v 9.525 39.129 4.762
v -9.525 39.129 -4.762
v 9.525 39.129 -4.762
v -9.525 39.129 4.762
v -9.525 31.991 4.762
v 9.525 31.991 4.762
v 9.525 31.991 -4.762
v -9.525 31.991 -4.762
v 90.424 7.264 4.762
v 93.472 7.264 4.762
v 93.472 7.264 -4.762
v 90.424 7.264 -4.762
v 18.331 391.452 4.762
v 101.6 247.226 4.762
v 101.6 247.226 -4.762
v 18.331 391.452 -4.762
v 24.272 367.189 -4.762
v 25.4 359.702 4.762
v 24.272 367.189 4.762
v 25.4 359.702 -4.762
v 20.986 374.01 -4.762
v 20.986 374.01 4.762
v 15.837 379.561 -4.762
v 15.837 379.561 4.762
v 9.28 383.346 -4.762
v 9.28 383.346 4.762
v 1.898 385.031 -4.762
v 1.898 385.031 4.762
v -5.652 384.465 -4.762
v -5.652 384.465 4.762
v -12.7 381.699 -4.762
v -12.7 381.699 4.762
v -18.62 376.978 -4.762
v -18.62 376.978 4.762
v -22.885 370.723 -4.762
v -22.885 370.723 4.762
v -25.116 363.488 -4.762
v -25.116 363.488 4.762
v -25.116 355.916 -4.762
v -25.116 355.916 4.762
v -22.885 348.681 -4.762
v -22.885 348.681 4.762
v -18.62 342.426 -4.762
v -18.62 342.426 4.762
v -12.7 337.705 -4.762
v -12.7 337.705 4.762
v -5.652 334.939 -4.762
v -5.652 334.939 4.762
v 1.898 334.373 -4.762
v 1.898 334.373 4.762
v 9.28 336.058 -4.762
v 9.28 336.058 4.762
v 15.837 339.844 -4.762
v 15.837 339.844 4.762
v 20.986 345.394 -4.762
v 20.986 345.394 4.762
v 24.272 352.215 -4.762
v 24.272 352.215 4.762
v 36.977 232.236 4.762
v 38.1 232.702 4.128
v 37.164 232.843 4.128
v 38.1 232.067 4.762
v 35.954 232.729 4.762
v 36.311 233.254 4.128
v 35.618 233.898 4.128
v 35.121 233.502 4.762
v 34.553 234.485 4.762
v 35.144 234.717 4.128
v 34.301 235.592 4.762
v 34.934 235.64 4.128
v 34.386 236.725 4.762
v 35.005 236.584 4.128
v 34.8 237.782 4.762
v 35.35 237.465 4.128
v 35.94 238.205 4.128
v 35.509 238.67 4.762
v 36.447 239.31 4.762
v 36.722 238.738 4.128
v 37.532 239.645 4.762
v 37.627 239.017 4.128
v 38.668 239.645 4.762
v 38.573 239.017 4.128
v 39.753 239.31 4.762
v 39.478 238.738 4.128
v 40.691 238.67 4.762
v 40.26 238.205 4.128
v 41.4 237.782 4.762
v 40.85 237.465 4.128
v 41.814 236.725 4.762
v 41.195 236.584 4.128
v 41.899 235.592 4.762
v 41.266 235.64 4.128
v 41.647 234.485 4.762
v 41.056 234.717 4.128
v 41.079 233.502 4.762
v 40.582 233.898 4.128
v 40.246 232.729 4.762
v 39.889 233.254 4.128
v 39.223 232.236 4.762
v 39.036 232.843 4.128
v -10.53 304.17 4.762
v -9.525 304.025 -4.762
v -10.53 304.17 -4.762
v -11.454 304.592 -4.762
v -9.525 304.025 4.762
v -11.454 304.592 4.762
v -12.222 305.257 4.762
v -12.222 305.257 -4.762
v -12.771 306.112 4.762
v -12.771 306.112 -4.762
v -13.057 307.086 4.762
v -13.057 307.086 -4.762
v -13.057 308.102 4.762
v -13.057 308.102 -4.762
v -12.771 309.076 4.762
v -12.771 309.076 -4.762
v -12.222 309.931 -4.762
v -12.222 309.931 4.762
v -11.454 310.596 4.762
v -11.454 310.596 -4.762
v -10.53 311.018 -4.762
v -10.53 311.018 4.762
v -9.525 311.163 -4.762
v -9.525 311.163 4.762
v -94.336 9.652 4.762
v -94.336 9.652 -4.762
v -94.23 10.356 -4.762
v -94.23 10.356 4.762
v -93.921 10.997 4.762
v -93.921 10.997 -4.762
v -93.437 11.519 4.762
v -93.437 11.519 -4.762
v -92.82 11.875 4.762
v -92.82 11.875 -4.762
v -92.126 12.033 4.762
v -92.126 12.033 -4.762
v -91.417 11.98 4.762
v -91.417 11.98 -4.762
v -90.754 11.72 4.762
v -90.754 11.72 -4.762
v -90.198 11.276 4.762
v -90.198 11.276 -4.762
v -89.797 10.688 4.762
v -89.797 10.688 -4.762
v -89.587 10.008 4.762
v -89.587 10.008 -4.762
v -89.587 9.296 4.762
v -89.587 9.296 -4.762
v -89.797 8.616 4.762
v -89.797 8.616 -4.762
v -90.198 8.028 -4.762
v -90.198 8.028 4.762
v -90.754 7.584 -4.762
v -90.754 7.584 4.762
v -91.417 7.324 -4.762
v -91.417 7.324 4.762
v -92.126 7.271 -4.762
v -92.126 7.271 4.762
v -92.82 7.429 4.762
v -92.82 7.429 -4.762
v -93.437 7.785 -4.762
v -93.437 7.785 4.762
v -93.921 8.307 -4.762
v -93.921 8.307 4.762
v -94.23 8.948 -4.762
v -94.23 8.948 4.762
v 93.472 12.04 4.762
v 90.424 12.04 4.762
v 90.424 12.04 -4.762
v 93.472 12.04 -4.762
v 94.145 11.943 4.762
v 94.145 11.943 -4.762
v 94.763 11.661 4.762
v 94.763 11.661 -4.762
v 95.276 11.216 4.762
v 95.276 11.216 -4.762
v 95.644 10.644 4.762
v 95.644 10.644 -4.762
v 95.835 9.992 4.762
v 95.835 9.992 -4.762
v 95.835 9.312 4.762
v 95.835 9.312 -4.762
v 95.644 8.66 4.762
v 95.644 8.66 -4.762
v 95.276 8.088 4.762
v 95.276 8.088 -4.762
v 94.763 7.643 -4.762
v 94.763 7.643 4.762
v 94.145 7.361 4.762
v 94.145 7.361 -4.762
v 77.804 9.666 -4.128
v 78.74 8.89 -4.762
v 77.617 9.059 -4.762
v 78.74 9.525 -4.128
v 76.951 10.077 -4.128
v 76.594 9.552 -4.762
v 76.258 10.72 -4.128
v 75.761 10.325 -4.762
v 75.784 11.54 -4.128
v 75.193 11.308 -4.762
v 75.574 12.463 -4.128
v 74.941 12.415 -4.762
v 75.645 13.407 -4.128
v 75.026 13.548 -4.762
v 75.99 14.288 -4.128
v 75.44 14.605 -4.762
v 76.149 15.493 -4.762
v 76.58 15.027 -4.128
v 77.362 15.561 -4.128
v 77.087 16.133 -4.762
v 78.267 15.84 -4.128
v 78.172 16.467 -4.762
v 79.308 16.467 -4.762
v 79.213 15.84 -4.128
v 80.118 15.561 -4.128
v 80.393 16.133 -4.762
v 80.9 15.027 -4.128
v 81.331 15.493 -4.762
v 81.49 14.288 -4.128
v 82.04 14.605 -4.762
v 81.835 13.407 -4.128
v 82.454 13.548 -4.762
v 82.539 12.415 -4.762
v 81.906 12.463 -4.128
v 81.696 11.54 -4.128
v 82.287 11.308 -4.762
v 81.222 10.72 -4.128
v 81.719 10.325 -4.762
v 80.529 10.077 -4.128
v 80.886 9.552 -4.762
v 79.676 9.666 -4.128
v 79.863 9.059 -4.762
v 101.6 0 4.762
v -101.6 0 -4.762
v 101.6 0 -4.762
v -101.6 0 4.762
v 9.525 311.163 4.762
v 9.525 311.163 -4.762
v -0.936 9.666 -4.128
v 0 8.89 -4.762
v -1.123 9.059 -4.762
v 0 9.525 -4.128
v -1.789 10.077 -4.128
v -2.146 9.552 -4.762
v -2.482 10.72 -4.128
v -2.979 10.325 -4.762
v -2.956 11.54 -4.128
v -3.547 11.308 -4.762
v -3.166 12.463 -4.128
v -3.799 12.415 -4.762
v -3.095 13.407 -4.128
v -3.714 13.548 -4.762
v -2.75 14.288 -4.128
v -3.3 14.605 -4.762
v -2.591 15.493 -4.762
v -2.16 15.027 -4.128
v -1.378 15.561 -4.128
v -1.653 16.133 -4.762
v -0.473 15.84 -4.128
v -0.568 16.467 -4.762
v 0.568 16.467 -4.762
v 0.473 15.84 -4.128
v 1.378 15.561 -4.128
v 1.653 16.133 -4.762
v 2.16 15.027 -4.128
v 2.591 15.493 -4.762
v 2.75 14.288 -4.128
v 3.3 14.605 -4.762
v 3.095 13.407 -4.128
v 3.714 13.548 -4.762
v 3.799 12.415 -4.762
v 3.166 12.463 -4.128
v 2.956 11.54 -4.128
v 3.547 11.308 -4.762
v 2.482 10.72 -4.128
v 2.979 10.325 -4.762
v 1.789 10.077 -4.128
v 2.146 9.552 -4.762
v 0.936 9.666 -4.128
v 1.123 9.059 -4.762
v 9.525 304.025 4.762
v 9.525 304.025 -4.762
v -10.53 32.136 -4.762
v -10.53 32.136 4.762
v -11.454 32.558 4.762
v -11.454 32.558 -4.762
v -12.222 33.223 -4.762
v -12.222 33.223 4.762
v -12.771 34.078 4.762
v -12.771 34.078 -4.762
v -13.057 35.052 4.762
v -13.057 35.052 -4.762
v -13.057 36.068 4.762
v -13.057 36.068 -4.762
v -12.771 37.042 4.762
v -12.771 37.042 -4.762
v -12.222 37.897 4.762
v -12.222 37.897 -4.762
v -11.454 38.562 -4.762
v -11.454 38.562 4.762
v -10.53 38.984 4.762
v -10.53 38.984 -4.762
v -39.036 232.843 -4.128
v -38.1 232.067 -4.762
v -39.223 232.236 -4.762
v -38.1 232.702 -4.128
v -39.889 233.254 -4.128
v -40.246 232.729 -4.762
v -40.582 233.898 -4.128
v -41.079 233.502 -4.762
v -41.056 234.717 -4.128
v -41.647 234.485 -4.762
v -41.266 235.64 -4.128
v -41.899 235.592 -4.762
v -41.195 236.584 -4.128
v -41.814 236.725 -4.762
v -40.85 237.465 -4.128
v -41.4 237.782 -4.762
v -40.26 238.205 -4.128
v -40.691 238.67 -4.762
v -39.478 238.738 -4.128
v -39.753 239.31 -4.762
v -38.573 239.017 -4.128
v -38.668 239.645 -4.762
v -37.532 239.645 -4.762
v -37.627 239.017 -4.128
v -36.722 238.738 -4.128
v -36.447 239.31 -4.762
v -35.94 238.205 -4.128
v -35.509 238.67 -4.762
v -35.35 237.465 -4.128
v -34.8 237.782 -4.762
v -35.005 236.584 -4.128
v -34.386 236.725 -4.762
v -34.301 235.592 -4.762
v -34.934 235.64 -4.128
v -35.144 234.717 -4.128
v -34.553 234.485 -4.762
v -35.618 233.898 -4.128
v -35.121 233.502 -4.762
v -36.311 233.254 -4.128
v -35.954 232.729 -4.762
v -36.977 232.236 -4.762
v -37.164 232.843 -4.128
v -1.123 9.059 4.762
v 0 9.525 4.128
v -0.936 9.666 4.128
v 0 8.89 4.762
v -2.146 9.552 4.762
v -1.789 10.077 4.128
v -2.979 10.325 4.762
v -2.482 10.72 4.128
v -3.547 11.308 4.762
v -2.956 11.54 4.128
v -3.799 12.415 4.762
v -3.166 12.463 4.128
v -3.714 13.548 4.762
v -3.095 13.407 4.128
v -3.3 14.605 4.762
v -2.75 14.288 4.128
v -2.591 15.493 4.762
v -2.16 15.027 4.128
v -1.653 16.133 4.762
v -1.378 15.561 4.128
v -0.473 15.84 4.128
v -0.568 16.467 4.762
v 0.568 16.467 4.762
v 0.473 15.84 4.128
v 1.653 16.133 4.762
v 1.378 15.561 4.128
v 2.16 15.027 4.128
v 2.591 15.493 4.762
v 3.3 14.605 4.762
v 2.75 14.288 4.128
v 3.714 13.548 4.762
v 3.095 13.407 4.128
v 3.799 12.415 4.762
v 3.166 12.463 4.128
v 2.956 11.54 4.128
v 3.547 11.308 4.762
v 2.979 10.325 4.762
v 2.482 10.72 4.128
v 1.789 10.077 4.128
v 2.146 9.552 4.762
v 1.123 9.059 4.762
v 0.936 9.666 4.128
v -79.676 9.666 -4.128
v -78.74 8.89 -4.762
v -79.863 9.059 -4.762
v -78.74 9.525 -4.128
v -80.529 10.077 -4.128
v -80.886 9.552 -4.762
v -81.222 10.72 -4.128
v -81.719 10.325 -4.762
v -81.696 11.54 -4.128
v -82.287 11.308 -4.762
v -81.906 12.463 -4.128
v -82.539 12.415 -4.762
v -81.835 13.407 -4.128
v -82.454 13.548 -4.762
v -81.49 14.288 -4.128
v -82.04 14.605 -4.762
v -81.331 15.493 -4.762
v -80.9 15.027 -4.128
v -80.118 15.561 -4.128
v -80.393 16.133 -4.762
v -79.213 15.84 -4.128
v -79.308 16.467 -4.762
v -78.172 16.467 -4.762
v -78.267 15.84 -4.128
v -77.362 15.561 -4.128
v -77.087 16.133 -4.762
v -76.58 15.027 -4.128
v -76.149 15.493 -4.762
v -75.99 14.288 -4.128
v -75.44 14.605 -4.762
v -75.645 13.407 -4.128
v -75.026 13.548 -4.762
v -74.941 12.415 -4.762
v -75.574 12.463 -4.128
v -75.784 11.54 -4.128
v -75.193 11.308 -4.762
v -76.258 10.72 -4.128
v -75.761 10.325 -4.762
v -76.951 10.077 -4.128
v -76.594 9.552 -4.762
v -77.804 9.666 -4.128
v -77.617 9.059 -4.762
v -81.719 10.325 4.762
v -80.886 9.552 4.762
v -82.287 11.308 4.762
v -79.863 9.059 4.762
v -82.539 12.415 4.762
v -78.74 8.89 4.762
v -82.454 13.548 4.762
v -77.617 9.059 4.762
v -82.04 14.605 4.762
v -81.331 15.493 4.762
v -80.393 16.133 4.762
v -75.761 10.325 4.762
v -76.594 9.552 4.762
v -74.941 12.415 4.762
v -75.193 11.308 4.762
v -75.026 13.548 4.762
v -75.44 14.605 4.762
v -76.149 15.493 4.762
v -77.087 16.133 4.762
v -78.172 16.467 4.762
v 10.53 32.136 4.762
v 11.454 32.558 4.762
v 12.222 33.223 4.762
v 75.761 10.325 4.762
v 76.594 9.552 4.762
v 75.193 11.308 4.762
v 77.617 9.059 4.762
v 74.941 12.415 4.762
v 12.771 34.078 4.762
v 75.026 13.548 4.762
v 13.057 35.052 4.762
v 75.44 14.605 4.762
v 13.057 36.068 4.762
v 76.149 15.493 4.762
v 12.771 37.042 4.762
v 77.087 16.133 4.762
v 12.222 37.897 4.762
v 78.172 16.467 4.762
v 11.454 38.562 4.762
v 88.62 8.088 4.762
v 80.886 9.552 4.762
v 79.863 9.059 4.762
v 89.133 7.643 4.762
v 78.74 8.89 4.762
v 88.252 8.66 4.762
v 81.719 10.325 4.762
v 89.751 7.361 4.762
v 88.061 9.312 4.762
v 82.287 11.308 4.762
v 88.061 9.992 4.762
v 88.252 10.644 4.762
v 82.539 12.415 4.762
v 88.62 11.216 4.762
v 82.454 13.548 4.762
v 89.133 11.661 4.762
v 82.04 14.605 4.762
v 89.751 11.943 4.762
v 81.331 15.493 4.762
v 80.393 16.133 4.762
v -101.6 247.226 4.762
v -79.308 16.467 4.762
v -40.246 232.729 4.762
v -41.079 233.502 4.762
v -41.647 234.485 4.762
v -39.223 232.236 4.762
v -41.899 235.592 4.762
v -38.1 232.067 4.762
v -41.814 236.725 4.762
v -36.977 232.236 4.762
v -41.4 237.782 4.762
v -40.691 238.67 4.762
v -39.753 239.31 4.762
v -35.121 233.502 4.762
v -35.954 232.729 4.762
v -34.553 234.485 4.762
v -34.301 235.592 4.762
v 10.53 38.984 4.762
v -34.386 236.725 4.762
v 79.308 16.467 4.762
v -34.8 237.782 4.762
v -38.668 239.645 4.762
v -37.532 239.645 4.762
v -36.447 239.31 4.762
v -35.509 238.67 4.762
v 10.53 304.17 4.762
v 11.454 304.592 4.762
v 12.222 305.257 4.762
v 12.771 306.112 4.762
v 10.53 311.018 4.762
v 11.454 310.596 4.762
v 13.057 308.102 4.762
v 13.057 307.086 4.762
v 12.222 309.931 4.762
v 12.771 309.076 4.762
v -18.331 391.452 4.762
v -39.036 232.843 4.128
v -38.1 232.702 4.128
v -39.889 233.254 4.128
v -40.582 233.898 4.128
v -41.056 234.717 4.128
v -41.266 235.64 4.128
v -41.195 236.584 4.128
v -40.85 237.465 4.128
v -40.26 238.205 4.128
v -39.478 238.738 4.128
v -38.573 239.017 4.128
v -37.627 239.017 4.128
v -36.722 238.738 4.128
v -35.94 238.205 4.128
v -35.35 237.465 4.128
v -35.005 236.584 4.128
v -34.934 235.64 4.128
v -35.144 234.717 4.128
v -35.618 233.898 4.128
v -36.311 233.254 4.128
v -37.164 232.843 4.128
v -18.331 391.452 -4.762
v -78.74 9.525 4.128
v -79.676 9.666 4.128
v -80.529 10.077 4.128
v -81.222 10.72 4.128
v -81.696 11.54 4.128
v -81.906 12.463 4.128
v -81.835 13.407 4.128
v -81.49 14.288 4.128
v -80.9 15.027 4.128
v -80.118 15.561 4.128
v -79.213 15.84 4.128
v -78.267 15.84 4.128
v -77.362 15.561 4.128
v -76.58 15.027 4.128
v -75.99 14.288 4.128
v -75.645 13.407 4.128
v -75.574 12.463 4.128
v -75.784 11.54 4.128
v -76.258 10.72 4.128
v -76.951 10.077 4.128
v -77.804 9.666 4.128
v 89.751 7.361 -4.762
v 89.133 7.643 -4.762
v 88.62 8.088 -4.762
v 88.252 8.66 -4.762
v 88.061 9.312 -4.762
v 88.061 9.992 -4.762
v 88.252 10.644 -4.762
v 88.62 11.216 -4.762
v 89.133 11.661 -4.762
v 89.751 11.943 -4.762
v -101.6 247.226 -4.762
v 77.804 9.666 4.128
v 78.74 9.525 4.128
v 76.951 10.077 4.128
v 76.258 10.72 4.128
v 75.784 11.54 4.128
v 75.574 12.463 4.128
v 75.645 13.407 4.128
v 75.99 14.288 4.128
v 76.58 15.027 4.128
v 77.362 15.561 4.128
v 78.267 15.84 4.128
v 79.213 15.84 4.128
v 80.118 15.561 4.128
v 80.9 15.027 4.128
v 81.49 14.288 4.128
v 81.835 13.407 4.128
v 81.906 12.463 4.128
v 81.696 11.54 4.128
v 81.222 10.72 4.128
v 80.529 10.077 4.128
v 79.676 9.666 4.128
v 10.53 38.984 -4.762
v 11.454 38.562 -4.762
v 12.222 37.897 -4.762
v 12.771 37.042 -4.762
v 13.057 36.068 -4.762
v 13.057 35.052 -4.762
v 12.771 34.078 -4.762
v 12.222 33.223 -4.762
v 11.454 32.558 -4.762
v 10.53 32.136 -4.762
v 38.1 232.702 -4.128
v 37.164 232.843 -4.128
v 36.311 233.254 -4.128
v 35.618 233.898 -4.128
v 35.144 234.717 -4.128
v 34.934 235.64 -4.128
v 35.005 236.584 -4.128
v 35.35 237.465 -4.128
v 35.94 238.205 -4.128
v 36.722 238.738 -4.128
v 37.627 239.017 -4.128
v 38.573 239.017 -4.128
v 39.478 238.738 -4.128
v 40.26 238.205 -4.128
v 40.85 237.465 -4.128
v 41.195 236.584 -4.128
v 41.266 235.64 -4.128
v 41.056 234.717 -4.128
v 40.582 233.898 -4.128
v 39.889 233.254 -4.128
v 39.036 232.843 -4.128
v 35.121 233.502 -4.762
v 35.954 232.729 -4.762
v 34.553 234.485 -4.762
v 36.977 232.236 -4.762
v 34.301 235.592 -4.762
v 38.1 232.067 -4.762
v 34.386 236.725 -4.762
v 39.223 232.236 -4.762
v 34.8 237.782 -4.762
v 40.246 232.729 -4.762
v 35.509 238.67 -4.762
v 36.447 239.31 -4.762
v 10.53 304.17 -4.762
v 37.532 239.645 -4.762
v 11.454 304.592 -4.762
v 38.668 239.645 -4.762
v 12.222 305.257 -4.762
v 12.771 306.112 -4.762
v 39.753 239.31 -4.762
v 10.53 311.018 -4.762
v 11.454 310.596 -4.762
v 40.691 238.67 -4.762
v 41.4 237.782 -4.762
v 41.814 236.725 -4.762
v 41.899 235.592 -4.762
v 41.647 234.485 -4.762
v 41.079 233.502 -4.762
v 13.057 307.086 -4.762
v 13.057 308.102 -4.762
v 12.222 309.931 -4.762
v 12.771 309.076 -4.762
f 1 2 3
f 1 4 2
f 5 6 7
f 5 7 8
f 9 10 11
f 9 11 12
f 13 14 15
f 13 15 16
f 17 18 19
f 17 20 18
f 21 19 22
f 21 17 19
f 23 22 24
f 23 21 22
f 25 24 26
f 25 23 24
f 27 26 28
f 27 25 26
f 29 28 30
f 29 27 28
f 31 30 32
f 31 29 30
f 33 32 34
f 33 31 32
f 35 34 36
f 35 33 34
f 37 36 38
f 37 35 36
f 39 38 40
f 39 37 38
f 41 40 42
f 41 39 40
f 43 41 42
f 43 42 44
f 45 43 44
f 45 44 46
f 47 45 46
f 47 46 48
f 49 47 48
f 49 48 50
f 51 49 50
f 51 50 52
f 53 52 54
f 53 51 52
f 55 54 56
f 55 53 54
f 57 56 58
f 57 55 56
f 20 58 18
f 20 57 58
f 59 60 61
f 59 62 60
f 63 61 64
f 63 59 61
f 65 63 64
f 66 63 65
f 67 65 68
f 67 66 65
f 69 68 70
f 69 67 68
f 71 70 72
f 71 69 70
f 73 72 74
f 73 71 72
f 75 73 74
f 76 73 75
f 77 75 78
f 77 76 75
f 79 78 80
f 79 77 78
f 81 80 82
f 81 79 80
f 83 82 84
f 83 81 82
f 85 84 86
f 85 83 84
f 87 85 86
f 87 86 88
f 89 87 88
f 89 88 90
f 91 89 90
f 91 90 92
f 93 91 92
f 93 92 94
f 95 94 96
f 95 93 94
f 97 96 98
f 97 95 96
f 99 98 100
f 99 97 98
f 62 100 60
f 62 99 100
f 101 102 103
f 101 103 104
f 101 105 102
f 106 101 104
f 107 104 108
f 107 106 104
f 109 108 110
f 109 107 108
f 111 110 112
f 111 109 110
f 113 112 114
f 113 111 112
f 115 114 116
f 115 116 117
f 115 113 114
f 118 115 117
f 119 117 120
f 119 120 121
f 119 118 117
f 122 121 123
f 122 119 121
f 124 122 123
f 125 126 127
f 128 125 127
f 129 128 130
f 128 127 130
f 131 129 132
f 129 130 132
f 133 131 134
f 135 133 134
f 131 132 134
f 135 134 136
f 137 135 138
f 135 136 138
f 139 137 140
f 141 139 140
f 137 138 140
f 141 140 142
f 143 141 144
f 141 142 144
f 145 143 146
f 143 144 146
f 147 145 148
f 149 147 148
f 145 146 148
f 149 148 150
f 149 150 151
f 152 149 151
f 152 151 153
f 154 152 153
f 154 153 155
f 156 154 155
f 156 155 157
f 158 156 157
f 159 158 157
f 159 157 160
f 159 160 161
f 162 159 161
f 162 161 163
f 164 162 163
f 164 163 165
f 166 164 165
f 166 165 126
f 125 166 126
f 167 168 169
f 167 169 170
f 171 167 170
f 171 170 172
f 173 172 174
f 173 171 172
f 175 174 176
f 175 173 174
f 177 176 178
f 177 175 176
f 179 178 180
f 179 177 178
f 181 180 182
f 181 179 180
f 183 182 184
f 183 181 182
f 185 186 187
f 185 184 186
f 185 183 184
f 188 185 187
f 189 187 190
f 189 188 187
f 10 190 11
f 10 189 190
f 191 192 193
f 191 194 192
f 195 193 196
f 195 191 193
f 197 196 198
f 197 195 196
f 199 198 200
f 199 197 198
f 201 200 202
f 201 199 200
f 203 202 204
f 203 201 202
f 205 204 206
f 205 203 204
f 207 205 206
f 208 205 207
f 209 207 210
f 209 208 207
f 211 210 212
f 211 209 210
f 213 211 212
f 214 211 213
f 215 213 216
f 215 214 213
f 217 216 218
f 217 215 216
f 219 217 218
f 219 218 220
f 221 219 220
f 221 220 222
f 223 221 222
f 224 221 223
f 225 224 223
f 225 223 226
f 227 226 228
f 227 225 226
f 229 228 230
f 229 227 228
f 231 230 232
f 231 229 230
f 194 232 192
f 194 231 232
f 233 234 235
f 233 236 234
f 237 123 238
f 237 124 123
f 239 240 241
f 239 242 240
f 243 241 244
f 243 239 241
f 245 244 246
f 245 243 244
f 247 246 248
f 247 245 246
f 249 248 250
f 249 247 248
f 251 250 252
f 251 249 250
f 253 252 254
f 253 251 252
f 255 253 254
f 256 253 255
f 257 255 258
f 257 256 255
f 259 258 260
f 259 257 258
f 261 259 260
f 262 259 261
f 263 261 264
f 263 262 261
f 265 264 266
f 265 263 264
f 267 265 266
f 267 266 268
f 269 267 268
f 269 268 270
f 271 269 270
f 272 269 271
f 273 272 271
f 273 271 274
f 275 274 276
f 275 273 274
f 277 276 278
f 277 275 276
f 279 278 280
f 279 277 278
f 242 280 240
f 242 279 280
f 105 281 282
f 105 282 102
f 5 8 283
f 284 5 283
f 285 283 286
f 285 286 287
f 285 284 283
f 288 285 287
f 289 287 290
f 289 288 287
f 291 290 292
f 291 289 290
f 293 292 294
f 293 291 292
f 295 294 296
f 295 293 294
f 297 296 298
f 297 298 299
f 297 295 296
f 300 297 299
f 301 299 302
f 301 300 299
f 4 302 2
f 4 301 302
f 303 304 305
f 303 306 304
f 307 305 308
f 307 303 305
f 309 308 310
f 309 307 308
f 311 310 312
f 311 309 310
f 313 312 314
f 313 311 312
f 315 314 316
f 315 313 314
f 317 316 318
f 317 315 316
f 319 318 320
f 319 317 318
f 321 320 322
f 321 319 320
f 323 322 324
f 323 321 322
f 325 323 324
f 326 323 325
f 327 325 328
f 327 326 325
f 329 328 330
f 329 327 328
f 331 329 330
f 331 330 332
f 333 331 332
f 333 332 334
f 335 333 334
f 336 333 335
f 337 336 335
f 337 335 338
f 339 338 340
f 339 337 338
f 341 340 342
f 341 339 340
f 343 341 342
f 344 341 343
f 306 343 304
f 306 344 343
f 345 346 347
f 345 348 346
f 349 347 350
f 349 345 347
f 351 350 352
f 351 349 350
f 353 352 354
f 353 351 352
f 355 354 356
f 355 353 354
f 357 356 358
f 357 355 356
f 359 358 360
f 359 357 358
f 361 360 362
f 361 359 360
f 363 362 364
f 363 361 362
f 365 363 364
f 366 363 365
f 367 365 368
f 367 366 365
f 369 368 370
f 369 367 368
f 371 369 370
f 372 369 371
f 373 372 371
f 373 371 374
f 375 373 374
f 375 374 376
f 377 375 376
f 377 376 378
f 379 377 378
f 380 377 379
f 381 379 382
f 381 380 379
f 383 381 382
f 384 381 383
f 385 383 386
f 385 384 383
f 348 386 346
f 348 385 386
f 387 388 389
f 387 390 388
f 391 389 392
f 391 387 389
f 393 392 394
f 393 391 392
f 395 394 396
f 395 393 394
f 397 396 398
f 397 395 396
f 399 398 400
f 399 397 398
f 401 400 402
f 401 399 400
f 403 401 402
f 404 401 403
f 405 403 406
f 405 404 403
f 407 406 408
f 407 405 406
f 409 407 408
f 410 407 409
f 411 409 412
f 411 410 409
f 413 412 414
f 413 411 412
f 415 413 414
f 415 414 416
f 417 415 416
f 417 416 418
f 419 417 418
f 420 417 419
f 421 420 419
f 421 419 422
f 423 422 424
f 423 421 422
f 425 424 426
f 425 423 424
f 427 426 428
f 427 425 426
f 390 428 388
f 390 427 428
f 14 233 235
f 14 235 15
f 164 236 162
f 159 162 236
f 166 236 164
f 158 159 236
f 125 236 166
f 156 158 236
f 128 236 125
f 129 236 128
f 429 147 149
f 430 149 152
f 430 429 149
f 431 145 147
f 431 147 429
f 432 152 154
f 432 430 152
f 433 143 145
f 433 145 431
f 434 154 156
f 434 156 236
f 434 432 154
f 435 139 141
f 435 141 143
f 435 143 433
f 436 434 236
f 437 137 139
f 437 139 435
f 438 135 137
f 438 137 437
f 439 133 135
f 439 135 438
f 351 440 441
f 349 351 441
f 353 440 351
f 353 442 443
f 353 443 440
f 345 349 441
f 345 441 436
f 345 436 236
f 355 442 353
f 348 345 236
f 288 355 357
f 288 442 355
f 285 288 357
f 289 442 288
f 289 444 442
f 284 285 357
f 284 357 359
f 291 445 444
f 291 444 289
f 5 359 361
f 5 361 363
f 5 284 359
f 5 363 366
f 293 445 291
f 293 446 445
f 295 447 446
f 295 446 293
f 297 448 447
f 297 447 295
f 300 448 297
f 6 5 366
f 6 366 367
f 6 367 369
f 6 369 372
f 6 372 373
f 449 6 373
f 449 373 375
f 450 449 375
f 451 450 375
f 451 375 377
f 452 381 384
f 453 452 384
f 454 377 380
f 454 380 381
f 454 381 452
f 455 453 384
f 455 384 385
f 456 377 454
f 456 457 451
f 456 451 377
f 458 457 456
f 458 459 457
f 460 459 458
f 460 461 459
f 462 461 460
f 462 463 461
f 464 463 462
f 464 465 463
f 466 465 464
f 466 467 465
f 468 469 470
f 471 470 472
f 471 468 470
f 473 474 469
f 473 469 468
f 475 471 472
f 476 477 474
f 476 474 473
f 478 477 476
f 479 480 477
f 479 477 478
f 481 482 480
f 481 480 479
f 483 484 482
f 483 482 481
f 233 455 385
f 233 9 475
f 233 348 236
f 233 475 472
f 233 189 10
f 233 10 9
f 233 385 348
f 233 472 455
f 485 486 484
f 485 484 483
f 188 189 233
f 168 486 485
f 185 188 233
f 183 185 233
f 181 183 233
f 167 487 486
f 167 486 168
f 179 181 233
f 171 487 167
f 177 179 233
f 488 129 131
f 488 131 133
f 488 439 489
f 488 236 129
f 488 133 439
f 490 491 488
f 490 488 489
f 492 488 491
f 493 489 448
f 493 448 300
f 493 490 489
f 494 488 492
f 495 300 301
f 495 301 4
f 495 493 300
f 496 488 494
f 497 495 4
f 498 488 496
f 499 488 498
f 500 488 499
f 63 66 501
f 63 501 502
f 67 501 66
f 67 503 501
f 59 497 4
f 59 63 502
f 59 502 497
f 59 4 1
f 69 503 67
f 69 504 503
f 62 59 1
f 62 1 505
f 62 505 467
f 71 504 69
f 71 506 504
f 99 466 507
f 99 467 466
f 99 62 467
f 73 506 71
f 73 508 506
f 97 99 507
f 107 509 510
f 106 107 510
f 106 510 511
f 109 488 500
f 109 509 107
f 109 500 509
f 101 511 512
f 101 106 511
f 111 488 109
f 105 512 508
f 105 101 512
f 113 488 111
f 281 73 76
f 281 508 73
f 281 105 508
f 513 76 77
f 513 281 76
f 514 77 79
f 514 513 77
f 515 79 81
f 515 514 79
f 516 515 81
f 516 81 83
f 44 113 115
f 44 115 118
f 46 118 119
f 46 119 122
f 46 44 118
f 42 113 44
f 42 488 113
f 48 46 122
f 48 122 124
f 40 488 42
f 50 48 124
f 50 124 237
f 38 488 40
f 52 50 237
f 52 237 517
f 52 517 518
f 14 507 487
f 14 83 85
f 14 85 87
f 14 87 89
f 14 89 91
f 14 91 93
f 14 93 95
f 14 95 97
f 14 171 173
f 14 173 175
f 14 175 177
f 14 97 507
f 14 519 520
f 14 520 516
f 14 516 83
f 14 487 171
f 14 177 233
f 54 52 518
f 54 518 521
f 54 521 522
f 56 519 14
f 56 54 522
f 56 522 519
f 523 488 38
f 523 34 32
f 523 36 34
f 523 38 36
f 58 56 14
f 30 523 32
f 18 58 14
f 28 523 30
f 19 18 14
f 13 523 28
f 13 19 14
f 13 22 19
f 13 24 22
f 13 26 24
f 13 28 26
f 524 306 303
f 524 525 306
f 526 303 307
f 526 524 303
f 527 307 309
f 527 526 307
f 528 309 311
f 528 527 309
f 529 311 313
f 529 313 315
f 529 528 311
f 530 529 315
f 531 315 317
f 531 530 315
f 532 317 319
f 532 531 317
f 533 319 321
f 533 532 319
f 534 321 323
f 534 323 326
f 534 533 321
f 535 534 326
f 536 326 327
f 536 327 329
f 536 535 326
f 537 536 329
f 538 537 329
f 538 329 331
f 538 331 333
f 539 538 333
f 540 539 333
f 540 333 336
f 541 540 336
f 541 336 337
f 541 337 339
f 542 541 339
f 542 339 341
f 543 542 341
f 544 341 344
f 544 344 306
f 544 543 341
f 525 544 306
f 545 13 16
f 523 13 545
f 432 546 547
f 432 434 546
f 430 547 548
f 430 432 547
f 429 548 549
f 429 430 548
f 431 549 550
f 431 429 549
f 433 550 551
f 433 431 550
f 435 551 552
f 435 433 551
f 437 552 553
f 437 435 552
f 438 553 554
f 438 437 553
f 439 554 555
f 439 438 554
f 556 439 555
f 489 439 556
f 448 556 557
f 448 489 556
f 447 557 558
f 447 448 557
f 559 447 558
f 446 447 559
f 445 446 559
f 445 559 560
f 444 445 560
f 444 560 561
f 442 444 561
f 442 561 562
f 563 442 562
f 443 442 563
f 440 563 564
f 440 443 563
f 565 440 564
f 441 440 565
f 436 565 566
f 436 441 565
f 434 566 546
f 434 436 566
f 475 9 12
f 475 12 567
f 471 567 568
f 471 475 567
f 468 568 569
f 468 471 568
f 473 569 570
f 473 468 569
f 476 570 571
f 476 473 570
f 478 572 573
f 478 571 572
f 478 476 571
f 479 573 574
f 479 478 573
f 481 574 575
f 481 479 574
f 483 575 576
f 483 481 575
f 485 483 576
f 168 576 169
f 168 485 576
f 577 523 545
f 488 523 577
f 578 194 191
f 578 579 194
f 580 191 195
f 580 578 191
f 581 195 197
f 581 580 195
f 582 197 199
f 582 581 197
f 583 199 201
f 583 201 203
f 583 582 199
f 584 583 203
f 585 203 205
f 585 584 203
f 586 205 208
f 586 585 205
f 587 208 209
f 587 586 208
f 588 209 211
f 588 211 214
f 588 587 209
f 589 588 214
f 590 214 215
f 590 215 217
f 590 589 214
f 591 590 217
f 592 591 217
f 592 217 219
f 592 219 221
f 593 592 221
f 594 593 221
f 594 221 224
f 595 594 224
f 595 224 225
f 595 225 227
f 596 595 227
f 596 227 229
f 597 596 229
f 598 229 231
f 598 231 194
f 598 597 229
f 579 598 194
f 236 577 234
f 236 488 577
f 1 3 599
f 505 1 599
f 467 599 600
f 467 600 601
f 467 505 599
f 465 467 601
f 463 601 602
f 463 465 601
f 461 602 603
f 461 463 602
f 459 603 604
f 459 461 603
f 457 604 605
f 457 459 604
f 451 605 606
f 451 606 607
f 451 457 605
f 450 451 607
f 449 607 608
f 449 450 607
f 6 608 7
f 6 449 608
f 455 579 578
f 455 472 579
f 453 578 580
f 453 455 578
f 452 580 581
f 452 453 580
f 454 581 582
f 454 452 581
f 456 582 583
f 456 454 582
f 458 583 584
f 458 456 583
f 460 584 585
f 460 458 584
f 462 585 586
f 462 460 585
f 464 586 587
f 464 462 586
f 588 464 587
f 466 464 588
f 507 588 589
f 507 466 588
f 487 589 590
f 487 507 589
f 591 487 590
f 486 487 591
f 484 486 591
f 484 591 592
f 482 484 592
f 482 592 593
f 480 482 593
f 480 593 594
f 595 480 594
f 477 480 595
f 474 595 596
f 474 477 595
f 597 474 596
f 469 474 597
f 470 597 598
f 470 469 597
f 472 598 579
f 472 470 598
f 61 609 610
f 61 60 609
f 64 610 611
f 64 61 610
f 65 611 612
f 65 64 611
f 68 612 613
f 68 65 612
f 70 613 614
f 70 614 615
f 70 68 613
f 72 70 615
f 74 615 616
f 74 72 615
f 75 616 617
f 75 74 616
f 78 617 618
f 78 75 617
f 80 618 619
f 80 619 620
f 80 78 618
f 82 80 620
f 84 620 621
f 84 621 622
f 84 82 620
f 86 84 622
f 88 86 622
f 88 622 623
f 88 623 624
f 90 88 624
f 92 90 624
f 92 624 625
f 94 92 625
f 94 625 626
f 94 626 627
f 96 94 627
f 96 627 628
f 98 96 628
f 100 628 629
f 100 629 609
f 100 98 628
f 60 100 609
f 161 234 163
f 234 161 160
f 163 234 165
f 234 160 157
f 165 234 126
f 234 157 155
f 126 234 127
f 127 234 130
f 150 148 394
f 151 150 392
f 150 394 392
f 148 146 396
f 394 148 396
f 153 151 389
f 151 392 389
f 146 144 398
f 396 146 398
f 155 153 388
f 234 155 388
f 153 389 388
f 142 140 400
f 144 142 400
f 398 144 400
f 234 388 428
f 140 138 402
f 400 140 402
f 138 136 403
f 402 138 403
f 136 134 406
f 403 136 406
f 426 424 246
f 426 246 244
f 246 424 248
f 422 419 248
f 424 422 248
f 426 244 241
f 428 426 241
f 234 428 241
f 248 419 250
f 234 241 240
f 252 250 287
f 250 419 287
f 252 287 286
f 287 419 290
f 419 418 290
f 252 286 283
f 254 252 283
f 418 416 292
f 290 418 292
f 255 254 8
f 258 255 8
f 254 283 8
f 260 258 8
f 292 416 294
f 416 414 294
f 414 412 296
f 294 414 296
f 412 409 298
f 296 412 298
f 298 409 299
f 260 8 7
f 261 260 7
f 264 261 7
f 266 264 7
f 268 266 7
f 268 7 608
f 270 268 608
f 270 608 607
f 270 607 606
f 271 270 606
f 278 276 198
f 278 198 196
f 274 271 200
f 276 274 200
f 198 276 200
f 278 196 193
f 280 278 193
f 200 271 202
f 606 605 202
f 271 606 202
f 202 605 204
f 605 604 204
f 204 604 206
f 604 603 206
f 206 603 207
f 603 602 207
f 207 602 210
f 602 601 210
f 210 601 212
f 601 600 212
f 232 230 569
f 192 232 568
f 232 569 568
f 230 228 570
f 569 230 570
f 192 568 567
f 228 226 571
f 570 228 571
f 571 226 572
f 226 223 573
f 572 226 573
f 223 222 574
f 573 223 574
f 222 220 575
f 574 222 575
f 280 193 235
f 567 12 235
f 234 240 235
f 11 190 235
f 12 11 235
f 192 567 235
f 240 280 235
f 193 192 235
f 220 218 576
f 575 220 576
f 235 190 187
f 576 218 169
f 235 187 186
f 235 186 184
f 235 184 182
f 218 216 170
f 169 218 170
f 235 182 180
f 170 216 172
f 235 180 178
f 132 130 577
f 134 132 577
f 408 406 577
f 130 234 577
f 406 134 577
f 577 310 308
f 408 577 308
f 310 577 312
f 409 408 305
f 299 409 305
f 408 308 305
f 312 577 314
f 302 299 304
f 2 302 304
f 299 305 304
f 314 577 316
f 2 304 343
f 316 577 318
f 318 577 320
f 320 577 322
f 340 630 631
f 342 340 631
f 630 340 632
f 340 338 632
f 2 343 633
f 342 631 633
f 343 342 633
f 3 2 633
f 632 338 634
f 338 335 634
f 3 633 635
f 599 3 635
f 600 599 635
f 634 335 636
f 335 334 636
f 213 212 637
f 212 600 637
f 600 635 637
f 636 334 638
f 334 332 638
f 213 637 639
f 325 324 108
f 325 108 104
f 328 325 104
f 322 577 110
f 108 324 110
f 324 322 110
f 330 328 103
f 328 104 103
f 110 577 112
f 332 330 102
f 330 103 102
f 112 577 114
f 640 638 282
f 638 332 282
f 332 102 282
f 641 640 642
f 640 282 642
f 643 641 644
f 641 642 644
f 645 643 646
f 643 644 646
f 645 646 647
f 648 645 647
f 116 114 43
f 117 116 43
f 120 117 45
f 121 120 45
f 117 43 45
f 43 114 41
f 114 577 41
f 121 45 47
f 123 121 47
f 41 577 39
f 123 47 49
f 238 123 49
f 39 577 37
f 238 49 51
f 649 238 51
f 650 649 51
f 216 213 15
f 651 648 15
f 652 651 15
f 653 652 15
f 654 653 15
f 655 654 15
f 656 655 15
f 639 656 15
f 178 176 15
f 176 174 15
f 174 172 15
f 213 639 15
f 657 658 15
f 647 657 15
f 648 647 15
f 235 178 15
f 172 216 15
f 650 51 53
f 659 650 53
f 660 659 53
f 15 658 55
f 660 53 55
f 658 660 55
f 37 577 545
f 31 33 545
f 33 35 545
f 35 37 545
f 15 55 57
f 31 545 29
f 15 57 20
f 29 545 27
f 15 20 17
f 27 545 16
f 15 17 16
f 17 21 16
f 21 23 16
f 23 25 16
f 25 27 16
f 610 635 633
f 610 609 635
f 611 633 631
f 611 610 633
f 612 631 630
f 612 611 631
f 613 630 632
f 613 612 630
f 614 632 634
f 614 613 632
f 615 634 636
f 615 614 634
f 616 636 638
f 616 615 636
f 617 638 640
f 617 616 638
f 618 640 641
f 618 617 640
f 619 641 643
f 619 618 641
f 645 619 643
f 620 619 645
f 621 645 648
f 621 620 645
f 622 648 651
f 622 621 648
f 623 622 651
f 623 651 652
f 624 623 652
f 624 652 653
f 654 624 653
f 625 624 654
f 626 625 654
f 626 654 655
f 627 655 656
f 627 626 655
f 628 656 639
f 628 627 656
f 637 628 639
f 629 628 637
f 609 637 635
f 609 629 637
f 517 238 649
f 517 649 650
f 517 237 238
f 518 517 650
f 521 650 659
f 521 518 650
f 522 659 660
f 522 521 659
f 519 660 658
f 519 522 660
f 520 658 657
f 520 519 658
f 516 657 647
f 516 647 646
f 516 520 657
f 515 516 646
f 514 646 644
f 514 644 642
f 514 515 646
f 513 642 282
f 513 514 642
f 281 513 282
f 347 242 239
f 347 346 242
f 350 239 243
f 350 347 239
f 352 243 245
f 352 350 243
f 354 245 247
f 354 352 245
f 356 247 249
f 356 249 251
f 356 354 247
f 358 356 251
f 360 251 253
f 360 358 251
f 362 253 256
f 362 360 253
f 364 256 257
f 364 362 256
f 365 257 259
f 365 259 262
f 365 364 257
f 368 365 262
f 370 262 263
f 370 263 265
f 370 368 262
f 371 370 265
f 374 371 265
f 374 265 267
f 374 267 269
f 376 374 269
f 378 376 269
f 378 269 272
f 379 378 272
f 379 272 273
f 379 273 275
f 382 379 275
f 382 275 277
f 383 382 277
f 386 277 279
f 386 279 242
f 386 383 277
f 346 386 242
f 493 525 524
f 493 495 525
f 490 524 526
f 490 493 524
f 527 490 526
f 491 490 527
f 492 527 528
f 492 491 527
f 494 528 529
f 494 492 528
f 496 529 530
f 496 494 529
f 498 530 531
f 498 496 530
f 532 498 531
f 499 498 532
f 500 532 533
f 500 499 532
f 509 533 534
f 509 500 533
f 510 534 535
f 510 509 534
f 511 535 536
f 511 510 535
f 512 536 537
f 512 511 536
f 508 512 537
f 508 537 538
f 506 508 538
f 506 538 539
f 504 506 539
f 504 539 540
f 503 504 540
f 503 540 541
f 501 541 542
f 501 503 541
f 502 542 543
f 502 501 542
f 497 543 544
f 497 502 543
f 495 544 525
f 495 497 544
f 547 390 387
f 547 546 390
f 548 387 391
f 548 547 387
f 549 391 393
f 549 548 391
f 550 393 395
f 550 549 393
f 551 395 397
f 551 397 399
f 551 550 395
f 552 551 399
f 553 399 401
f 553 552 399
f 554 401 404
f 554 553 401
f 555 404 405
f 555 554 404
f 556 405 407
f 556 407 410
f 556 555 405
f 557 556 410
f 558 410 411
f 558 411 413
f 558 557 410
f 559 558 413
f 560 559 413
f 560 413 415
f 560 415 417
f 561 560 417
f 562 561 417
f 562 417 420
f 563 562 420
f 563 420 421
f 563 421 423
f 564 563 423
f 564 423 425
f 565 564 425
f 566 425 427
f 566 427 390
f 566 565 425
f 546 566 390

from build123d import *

# Parameters (mm, degrees)
SKETCH6_R                        = 25.4
BOSS_EXTRUDE1_DEPTH              = 4.7625
F_1_4_20_TAPPED_HOLE1_AT_2_COUNT = 2
F_1_4_20_TAPPED_HOLE1_AT_2_PITCH = 76.2
F_3_16_0_1875_DIAMETER_HOLE1_D   = 4.7752
CUT_EXTRUDE1_DEPTH               = 10.525
F_1_4_20_TAPPED_HOLE2_AT_2_COUNT = 2
F_1_4_20_TAPPED_HOLE2_AT_2_PITCH = 78.74
F_1_4_20_TAPPED_HOLE2_AT_3_COUNT = 2
F_1_4_20_TAPPED_HOLE2_AT_3_PITCH = 78.74


with BuildPart() as part:
    # Sketch6 → Boss-Extrude1 (new body, symmetric)
    with BuildSketch(Plane.XY):
        Polygon((-101.6, 0), (101.6, 0), (101.6, 247.225737951), (18.330871047, 391.4521), (-18.330871047, 391.4521), (-101.6, 247.225737951), align=None)
        with Locations((0, 359.7021)):
            Circle(SKETCH6_R, mode=Mode.SUBTRACT)
        with BuildLine():
            Line((9.525, 31.9913), (-9.525, 31.9913))
            ThreePointArc((-9.525, 31.9913), (-13.0937, 35.56), (-9.525, 39.1287))
            Line((-9.525, 39.1287), (9.525, 39.1287))
            ThreePointArc((9.525, 39.1287), (13.0937, 35.56), (9.525, 31.9913))
        make_face(mode=Mode.SUBTRACT)
        with BuildLine():
            Line((9.525, 304.0253), (-9.525, 304.0253))
            ThreePointArc((-9.525, 304.0253), (-13.0937, 307.594), (-9.525, 311.1627))
            Line((-9.525, 311.1627), (9.525, 311.1627))
            ThreePointArc((9.525, 311.1627), (13.0937, 307.594), (9.525, 304.0253))
        make_face(mode=Mode.SUBTRACT)
    extrude(amount=BOSS_EXTRUDE1_DEPTH, both=True)

    # Sketch7 → 1/4-20 Tapped Hole1 (revolve, cut)
    with BuildSketch(Plane(origin=(-38.1, 235.8771, 4.7625), x_dir=(0, -1, 0), z_dir=(1, 0, 0))):
        Polygon((0, 0), (0, 9.525), (3.81, 9.525), (3.175, 8.89), (3.175, 0.635), (3.81, 0), align=None)
    f_1_4_20_tapped_hole1 = revolve(axis=Axis((-38.1, 235.8771, 11.1125), (0, 0, -1)), mode=Mode.SUBTRACT)

    # 1/4-20 Tapped Hole1 at 2: 1/4-20 Tapped Hole1 ×2
    with Locations(*[(i * F_1_4_20_TAPPED_HOLE1_AT_2_PITCH, 0, 0) for i in range(1, F_1_4_20_TAPPED_HOLE1_AT_2_COUNT)]):
        add(f_1_4_20_tapped_hole1, mode=Mode.SUBTRACT)

    # 3/16 (0.1875) Diameter Hole1 (through all)
    with Locations(Plane(origin=(643.650137784, 199.419465463, 4.7625), x_dir=(1, 0, 0), z_dir=(0, 0, 1))):
        with Locations((-735.598137784, -189.767465463)):
            Hole(F_3_16_0_1875_DIAMETER_HOLE1_D / 2)

    # Sketch13 → Cut-Extrude1 (cut, through all)
    with BuildSketch(Plane.XY.offset(4.7625)):
        with BuildLine():
            Line((90.424, 12.0396), (93.472, 12.0396))
            ThreePointArc((93.472, 12.0396), (95.8596, 9.652), (93.472, 7.2644))
            Line((93.472, 7.2644), (90.424, 7.2644))
            ThreePointArc((90.424, 7.2644), (88.0364, 9.652), (90.424, 12.0396))
        make_face()
    extrude(amount=-CUT_EXTRUDE1_DEPTH, mode=Mode.SUBTRACT)

    # Sketch11 → 1/4-20 Tapped Hole2 (revolve, cut)
    with BuildSketch(Plane(origin=(0, 12.7, 4.7625), x_dir=(0, -1, 0), z_dir=(1, 0, 0))):
        Polygon((0, 0), (0, 9.525), (3.81, 9.525), (3.175, 8.89), (3.175, 0.635), (3.81, 0), align=None)
    f_1_4_20_tapped_hole2 = revolve(axis=Axis((0, 12.7, 11.1125), (0, 0, -1)), mode=Mode.SUBTRACT)

    # 1/4-20 Tapped Hole2 at 2: 1/4-20 Tapped Hole2 ×2
    with Locations(*[(i * F_1_4_20_TAPPED_HOLE2_AT_2_PITCH, 0, 0) for i in range(1, F_1_4_20_TAPPED_HOLE2_AT_2_COUNT)]):
        add(f_1_4_20_tapped_hole2, mode=Mode.SUBTRACT)

    # 1/4-20 Tapped Hole2 at 3: 1/4-20 Tapped Hole2 ×2
    with Locations(*[(-i * F_1_4_20_TAPPED_HOLE2_AT_3_PITCH, 0, 0) for i in range(1, F_1_4_20_TAPPED_HOLE2_AT_3_COUNT)]):
        add(f_1_4_20_tapped_hole2, mode=Mode.SUBTRACT)


solid = part.part
